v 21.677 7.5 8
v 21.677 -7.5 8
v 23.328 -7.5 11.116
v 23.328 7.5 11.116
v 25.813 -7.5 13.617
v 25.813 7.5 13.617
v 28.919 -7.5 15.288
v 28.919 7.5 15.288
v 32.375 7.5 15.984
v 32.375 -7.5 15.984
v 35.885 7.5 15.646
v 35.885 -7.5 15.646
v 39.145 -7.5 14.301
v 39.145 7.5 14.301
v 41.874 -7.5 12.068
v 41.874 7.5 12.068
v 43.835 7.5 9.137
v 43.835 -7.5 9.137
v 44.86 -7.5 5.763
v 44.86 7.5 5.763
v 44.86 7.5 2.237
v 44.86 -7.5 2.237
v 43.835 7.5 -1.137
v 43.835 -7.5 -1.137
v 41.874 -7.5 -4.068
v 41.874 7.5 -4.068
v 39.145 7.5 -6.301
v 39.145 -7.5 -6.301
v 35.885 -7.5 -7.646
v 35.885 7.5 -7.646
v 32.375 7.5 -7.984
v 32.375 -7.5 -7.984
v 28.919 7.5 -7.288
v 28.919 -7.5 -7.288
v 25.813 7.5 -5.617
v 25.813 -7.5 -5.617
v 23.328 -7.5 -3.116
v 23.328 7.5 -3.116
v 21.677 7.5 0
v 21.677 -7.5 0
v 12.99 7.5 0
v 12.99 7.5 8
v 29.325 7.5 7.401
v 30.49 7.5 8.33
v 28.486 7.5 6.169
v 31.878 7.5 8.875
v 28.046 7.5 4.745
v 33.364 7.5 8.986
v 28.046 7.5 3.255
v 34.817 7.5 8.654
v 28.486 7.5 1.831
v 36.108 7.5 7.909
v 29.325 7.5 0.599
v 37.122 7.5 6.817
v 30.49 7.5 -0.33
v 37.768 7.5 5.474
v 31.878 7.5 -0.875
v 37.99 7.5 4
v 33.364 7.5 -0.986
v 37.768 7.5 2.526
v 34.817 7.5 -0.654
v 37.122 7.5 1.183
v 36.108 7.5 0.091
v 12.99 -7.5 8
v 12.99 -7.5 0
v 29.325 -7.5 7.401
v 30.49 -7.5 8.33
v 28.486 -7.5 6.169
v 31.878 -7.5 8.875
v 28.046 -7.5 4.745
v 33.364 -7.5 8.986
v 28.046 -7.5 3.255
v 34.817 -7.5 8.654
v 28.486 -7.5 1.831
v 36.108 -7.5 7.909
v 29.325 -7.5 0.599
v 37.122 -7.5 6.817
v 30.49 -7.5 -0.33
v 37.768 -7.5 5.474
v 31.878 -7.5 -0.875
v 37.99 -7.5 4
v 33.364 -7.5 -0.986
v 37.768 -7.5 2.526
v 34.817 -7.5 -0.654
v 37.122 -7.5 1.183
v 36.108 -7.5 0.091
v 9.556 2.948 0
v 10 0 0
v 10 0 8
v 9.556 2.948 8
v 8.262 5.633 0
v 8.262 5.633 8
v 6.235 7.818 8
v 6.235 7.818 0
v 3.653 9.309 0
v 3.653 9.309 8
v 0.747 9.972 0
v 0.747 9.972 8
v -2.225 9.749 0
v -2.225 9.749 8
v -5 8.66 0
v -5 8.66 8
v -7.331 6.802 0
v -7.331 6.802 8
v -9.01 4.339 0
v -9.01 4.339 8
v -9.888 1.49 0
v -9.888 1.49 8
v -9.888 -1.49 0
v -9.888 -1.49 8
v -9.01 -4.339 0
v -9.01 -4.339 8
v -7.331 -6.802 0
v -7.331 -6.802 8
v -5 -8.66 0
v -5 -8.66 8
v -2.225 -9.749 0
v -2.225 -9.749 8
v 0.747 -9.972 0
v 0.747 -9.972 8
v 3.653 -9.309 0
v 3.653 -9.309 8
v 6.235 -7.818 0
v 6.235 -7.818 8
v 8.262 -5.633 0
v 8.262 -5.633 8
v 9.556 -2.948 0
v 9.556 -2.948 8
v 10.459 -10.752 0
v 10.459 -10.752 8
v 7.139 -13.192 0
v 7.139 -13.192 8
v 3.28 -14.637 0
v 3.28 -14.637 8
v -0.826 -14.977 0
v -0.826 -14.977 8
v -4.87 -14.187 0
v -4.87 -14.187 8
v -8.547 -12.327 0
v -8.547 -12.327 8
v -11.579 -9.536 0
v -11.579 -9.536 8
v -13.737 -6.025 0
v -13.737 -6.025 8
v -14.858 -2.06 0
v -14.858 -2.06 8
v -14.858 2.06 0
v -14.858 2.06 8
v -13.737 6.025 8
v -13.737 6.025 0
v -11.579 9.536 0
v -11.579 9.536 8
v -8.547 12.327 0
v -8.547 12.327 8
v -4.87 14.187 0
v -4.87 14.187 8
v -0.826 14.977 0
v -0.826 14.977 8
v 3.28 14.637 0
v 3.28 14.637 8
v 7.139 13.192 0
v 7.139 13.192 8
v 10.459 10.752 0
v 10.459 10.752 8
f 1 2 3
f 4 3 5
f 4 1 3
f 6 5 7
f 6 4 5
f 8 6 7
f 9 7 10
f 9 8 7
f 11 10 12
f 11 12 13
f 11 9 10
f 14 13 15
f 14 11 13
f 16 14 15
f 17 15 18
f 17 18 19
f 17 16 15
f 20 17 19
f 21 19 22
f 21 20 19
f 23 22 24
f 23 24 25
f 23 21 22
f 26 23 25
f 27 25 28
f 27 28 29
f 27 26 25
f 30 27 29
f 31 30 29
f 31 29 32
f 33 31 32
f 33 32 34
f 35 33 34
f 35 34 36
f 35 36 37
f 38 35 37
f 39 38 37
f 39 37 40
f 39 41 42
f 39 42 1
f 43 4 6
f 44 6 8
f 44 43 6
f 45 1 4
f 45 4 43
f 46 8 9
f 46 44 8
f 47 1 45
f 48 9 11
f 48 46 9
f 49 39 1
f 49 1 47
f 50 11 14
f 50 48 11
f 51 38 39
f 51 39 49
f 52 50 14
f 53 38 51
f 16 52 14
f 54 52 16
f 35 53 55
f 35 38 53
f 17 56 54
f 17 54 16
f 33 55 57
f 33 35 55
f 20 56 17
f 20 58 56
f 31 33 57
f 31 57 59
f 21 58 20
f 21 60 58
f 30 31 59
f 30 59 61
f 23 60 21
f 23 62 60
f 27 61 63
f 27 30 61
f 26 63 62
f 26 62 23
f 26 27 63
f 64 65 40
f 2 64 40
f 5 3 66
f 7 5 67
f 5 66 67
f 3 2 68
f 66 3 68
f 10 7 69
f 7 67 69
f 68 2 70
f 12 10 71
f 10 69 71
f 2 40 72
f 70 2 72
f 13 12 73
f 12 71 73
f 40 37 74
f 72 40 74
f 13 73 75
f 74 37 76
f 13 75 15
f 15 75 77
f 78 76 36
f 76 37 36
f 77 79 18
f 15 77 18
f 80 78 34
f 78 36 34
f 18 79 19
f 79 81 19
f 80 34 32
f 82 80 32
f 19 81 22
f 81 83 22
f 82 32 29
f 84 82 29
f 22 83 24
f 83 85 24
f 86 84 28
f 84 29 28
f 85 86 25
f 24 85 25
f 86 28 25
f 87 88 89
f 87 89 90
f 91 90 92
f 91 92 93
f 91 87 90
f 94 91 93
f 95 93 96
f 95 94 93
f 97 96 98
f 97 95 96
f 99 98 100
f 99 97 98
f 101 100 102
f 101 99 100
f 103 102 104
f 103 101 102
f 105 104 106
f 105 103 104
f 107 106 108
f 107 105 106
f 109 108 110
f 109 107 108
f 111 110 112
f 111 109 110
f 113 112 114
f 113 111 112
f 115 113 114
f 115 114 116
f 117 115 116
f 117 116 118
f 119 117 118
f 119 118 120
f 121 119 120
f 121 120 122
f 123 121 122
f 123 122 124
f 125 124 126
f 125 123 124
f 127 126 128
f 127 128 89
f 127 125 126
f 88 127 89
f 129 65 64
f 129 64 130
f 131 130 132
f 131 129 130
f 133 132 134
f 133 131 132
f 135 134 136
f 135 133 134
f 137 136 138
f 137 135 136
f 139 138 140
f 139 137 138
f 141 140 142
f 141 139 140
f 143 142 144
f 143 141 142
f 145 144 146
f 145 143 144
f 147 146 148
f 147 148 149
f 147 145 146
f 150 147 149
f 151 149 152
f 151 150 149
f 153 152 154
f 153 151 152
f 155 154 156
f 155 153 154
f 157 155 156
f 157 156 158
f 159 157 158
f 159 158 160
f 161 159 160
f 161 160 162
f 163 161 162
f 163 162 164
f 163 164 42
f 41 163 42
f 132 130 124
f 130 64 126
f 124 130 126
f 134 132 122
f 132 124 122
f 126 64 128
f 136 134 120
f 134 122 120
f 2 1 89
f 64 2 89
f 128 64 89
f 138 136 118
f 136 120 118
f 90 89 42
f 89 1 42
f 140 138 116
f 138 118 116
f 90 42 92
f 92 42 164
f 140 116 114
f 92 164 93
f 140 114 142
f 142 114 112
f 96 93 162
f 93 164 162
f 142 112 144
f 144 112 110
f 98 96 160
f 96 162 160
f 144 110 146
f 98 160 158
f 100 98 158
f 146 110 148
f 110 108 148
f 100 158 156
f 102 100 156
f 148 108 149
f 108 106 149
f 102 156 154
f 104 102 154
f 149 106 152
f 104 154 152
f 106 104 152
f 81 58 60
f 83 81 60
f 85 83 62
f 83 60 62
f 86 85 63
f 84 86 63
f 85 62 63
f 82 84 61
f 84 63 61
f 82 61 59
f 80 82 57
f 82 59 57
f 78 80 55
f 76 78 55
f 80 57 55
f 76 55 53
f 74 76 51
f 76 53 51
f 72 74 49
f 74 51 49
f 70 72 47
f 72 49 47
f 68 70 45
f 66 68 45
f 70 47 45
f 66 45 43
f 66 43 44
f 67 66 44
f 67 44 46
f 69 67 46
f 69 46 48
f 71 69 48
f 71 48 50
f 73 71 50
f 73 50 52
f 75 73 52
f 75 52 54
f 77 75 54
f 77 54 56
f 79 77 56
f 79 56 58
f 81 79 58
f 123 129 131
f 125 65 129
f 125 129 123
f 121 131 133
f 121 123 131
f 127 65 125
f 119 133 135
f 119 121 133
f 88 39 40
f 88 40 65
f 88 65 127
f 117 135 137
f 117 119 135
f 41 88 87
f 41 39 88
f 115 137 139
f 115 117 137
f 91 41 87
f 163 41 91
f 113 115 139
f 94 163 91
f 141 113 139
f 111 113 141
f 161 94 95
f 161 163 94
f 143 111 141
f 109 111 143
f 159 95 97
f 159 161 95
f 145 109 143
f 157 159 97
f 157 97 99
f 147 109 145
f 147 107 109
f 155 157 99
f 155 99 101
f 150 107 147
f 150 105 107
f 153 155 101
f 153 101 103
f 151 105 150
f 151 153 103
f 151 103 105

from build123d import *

# Parameters (mm, degrees)
SKETCH1_R           = 10
BOSS_EXTRUDE1_DEPTH = 8
BOSS_EXTRUDE2_DEPTH = 15
SKETCH3_R           = 5
CUT_EXTRUDE1_DEPTH  = 23.5


with BuildPart() as part:
    # Sketch1 → Boss-Extrude1 (new body)
    with BuildSketch(Plane.XY):
        with BuildLine():
            Line((12.990381057, 7.5), (32.990381057, 7.5))
            Line((32.990381057, 7.5), (32.990381057, -7.5))
            Line((32.990381057, -7.5), (12.990381057, -7.5))
            ThreePointArc((12.990381057, -7.5), (-15, 0), (12.990381057, 7.5))
        make_face()
        Circle(SKETCH1_R, mode=Mode.SUBTRACT)
    extrude(amount=BOSS_EXTRUDE1_DEPTH)

    # Sketch2 → Boss-Extrude2 (add)
    with BuildSketch(Plane(origin=(0, 7.5, 0), x_dir=(1, 0, 0), z_dir=(0, 1, 0))):
        with BuildLine():
            ThreePointArc((21.676672558, -8), (44.990381057, -4), (21.676672558, 0))
            Line((21.676672558, 0), (32.990381057, 0))
            Line((32.990381057, 0), (32.990381057, -8))
            Line((32.990381057, -8), (21.676672558, -8))
        make_face()
    extrude(amount=-BOSS_EXTRUDE2_DEPTH)

    # Sketch3 → Cut-Extrude1 (cut, through all)
    with BuildSketch(Plane(origin=(0, 7.5, 0), x_dir=(1, 0, 0), z_dir=(0, 1, 0))):
        with Locations((32.990381057, -4)):
            Circle(SKETCH3_R)
    extrude(amount=-CUT_EXTRUDE1_DEPTH, mode=Mode.SUBTRACT)


solid = part.part
